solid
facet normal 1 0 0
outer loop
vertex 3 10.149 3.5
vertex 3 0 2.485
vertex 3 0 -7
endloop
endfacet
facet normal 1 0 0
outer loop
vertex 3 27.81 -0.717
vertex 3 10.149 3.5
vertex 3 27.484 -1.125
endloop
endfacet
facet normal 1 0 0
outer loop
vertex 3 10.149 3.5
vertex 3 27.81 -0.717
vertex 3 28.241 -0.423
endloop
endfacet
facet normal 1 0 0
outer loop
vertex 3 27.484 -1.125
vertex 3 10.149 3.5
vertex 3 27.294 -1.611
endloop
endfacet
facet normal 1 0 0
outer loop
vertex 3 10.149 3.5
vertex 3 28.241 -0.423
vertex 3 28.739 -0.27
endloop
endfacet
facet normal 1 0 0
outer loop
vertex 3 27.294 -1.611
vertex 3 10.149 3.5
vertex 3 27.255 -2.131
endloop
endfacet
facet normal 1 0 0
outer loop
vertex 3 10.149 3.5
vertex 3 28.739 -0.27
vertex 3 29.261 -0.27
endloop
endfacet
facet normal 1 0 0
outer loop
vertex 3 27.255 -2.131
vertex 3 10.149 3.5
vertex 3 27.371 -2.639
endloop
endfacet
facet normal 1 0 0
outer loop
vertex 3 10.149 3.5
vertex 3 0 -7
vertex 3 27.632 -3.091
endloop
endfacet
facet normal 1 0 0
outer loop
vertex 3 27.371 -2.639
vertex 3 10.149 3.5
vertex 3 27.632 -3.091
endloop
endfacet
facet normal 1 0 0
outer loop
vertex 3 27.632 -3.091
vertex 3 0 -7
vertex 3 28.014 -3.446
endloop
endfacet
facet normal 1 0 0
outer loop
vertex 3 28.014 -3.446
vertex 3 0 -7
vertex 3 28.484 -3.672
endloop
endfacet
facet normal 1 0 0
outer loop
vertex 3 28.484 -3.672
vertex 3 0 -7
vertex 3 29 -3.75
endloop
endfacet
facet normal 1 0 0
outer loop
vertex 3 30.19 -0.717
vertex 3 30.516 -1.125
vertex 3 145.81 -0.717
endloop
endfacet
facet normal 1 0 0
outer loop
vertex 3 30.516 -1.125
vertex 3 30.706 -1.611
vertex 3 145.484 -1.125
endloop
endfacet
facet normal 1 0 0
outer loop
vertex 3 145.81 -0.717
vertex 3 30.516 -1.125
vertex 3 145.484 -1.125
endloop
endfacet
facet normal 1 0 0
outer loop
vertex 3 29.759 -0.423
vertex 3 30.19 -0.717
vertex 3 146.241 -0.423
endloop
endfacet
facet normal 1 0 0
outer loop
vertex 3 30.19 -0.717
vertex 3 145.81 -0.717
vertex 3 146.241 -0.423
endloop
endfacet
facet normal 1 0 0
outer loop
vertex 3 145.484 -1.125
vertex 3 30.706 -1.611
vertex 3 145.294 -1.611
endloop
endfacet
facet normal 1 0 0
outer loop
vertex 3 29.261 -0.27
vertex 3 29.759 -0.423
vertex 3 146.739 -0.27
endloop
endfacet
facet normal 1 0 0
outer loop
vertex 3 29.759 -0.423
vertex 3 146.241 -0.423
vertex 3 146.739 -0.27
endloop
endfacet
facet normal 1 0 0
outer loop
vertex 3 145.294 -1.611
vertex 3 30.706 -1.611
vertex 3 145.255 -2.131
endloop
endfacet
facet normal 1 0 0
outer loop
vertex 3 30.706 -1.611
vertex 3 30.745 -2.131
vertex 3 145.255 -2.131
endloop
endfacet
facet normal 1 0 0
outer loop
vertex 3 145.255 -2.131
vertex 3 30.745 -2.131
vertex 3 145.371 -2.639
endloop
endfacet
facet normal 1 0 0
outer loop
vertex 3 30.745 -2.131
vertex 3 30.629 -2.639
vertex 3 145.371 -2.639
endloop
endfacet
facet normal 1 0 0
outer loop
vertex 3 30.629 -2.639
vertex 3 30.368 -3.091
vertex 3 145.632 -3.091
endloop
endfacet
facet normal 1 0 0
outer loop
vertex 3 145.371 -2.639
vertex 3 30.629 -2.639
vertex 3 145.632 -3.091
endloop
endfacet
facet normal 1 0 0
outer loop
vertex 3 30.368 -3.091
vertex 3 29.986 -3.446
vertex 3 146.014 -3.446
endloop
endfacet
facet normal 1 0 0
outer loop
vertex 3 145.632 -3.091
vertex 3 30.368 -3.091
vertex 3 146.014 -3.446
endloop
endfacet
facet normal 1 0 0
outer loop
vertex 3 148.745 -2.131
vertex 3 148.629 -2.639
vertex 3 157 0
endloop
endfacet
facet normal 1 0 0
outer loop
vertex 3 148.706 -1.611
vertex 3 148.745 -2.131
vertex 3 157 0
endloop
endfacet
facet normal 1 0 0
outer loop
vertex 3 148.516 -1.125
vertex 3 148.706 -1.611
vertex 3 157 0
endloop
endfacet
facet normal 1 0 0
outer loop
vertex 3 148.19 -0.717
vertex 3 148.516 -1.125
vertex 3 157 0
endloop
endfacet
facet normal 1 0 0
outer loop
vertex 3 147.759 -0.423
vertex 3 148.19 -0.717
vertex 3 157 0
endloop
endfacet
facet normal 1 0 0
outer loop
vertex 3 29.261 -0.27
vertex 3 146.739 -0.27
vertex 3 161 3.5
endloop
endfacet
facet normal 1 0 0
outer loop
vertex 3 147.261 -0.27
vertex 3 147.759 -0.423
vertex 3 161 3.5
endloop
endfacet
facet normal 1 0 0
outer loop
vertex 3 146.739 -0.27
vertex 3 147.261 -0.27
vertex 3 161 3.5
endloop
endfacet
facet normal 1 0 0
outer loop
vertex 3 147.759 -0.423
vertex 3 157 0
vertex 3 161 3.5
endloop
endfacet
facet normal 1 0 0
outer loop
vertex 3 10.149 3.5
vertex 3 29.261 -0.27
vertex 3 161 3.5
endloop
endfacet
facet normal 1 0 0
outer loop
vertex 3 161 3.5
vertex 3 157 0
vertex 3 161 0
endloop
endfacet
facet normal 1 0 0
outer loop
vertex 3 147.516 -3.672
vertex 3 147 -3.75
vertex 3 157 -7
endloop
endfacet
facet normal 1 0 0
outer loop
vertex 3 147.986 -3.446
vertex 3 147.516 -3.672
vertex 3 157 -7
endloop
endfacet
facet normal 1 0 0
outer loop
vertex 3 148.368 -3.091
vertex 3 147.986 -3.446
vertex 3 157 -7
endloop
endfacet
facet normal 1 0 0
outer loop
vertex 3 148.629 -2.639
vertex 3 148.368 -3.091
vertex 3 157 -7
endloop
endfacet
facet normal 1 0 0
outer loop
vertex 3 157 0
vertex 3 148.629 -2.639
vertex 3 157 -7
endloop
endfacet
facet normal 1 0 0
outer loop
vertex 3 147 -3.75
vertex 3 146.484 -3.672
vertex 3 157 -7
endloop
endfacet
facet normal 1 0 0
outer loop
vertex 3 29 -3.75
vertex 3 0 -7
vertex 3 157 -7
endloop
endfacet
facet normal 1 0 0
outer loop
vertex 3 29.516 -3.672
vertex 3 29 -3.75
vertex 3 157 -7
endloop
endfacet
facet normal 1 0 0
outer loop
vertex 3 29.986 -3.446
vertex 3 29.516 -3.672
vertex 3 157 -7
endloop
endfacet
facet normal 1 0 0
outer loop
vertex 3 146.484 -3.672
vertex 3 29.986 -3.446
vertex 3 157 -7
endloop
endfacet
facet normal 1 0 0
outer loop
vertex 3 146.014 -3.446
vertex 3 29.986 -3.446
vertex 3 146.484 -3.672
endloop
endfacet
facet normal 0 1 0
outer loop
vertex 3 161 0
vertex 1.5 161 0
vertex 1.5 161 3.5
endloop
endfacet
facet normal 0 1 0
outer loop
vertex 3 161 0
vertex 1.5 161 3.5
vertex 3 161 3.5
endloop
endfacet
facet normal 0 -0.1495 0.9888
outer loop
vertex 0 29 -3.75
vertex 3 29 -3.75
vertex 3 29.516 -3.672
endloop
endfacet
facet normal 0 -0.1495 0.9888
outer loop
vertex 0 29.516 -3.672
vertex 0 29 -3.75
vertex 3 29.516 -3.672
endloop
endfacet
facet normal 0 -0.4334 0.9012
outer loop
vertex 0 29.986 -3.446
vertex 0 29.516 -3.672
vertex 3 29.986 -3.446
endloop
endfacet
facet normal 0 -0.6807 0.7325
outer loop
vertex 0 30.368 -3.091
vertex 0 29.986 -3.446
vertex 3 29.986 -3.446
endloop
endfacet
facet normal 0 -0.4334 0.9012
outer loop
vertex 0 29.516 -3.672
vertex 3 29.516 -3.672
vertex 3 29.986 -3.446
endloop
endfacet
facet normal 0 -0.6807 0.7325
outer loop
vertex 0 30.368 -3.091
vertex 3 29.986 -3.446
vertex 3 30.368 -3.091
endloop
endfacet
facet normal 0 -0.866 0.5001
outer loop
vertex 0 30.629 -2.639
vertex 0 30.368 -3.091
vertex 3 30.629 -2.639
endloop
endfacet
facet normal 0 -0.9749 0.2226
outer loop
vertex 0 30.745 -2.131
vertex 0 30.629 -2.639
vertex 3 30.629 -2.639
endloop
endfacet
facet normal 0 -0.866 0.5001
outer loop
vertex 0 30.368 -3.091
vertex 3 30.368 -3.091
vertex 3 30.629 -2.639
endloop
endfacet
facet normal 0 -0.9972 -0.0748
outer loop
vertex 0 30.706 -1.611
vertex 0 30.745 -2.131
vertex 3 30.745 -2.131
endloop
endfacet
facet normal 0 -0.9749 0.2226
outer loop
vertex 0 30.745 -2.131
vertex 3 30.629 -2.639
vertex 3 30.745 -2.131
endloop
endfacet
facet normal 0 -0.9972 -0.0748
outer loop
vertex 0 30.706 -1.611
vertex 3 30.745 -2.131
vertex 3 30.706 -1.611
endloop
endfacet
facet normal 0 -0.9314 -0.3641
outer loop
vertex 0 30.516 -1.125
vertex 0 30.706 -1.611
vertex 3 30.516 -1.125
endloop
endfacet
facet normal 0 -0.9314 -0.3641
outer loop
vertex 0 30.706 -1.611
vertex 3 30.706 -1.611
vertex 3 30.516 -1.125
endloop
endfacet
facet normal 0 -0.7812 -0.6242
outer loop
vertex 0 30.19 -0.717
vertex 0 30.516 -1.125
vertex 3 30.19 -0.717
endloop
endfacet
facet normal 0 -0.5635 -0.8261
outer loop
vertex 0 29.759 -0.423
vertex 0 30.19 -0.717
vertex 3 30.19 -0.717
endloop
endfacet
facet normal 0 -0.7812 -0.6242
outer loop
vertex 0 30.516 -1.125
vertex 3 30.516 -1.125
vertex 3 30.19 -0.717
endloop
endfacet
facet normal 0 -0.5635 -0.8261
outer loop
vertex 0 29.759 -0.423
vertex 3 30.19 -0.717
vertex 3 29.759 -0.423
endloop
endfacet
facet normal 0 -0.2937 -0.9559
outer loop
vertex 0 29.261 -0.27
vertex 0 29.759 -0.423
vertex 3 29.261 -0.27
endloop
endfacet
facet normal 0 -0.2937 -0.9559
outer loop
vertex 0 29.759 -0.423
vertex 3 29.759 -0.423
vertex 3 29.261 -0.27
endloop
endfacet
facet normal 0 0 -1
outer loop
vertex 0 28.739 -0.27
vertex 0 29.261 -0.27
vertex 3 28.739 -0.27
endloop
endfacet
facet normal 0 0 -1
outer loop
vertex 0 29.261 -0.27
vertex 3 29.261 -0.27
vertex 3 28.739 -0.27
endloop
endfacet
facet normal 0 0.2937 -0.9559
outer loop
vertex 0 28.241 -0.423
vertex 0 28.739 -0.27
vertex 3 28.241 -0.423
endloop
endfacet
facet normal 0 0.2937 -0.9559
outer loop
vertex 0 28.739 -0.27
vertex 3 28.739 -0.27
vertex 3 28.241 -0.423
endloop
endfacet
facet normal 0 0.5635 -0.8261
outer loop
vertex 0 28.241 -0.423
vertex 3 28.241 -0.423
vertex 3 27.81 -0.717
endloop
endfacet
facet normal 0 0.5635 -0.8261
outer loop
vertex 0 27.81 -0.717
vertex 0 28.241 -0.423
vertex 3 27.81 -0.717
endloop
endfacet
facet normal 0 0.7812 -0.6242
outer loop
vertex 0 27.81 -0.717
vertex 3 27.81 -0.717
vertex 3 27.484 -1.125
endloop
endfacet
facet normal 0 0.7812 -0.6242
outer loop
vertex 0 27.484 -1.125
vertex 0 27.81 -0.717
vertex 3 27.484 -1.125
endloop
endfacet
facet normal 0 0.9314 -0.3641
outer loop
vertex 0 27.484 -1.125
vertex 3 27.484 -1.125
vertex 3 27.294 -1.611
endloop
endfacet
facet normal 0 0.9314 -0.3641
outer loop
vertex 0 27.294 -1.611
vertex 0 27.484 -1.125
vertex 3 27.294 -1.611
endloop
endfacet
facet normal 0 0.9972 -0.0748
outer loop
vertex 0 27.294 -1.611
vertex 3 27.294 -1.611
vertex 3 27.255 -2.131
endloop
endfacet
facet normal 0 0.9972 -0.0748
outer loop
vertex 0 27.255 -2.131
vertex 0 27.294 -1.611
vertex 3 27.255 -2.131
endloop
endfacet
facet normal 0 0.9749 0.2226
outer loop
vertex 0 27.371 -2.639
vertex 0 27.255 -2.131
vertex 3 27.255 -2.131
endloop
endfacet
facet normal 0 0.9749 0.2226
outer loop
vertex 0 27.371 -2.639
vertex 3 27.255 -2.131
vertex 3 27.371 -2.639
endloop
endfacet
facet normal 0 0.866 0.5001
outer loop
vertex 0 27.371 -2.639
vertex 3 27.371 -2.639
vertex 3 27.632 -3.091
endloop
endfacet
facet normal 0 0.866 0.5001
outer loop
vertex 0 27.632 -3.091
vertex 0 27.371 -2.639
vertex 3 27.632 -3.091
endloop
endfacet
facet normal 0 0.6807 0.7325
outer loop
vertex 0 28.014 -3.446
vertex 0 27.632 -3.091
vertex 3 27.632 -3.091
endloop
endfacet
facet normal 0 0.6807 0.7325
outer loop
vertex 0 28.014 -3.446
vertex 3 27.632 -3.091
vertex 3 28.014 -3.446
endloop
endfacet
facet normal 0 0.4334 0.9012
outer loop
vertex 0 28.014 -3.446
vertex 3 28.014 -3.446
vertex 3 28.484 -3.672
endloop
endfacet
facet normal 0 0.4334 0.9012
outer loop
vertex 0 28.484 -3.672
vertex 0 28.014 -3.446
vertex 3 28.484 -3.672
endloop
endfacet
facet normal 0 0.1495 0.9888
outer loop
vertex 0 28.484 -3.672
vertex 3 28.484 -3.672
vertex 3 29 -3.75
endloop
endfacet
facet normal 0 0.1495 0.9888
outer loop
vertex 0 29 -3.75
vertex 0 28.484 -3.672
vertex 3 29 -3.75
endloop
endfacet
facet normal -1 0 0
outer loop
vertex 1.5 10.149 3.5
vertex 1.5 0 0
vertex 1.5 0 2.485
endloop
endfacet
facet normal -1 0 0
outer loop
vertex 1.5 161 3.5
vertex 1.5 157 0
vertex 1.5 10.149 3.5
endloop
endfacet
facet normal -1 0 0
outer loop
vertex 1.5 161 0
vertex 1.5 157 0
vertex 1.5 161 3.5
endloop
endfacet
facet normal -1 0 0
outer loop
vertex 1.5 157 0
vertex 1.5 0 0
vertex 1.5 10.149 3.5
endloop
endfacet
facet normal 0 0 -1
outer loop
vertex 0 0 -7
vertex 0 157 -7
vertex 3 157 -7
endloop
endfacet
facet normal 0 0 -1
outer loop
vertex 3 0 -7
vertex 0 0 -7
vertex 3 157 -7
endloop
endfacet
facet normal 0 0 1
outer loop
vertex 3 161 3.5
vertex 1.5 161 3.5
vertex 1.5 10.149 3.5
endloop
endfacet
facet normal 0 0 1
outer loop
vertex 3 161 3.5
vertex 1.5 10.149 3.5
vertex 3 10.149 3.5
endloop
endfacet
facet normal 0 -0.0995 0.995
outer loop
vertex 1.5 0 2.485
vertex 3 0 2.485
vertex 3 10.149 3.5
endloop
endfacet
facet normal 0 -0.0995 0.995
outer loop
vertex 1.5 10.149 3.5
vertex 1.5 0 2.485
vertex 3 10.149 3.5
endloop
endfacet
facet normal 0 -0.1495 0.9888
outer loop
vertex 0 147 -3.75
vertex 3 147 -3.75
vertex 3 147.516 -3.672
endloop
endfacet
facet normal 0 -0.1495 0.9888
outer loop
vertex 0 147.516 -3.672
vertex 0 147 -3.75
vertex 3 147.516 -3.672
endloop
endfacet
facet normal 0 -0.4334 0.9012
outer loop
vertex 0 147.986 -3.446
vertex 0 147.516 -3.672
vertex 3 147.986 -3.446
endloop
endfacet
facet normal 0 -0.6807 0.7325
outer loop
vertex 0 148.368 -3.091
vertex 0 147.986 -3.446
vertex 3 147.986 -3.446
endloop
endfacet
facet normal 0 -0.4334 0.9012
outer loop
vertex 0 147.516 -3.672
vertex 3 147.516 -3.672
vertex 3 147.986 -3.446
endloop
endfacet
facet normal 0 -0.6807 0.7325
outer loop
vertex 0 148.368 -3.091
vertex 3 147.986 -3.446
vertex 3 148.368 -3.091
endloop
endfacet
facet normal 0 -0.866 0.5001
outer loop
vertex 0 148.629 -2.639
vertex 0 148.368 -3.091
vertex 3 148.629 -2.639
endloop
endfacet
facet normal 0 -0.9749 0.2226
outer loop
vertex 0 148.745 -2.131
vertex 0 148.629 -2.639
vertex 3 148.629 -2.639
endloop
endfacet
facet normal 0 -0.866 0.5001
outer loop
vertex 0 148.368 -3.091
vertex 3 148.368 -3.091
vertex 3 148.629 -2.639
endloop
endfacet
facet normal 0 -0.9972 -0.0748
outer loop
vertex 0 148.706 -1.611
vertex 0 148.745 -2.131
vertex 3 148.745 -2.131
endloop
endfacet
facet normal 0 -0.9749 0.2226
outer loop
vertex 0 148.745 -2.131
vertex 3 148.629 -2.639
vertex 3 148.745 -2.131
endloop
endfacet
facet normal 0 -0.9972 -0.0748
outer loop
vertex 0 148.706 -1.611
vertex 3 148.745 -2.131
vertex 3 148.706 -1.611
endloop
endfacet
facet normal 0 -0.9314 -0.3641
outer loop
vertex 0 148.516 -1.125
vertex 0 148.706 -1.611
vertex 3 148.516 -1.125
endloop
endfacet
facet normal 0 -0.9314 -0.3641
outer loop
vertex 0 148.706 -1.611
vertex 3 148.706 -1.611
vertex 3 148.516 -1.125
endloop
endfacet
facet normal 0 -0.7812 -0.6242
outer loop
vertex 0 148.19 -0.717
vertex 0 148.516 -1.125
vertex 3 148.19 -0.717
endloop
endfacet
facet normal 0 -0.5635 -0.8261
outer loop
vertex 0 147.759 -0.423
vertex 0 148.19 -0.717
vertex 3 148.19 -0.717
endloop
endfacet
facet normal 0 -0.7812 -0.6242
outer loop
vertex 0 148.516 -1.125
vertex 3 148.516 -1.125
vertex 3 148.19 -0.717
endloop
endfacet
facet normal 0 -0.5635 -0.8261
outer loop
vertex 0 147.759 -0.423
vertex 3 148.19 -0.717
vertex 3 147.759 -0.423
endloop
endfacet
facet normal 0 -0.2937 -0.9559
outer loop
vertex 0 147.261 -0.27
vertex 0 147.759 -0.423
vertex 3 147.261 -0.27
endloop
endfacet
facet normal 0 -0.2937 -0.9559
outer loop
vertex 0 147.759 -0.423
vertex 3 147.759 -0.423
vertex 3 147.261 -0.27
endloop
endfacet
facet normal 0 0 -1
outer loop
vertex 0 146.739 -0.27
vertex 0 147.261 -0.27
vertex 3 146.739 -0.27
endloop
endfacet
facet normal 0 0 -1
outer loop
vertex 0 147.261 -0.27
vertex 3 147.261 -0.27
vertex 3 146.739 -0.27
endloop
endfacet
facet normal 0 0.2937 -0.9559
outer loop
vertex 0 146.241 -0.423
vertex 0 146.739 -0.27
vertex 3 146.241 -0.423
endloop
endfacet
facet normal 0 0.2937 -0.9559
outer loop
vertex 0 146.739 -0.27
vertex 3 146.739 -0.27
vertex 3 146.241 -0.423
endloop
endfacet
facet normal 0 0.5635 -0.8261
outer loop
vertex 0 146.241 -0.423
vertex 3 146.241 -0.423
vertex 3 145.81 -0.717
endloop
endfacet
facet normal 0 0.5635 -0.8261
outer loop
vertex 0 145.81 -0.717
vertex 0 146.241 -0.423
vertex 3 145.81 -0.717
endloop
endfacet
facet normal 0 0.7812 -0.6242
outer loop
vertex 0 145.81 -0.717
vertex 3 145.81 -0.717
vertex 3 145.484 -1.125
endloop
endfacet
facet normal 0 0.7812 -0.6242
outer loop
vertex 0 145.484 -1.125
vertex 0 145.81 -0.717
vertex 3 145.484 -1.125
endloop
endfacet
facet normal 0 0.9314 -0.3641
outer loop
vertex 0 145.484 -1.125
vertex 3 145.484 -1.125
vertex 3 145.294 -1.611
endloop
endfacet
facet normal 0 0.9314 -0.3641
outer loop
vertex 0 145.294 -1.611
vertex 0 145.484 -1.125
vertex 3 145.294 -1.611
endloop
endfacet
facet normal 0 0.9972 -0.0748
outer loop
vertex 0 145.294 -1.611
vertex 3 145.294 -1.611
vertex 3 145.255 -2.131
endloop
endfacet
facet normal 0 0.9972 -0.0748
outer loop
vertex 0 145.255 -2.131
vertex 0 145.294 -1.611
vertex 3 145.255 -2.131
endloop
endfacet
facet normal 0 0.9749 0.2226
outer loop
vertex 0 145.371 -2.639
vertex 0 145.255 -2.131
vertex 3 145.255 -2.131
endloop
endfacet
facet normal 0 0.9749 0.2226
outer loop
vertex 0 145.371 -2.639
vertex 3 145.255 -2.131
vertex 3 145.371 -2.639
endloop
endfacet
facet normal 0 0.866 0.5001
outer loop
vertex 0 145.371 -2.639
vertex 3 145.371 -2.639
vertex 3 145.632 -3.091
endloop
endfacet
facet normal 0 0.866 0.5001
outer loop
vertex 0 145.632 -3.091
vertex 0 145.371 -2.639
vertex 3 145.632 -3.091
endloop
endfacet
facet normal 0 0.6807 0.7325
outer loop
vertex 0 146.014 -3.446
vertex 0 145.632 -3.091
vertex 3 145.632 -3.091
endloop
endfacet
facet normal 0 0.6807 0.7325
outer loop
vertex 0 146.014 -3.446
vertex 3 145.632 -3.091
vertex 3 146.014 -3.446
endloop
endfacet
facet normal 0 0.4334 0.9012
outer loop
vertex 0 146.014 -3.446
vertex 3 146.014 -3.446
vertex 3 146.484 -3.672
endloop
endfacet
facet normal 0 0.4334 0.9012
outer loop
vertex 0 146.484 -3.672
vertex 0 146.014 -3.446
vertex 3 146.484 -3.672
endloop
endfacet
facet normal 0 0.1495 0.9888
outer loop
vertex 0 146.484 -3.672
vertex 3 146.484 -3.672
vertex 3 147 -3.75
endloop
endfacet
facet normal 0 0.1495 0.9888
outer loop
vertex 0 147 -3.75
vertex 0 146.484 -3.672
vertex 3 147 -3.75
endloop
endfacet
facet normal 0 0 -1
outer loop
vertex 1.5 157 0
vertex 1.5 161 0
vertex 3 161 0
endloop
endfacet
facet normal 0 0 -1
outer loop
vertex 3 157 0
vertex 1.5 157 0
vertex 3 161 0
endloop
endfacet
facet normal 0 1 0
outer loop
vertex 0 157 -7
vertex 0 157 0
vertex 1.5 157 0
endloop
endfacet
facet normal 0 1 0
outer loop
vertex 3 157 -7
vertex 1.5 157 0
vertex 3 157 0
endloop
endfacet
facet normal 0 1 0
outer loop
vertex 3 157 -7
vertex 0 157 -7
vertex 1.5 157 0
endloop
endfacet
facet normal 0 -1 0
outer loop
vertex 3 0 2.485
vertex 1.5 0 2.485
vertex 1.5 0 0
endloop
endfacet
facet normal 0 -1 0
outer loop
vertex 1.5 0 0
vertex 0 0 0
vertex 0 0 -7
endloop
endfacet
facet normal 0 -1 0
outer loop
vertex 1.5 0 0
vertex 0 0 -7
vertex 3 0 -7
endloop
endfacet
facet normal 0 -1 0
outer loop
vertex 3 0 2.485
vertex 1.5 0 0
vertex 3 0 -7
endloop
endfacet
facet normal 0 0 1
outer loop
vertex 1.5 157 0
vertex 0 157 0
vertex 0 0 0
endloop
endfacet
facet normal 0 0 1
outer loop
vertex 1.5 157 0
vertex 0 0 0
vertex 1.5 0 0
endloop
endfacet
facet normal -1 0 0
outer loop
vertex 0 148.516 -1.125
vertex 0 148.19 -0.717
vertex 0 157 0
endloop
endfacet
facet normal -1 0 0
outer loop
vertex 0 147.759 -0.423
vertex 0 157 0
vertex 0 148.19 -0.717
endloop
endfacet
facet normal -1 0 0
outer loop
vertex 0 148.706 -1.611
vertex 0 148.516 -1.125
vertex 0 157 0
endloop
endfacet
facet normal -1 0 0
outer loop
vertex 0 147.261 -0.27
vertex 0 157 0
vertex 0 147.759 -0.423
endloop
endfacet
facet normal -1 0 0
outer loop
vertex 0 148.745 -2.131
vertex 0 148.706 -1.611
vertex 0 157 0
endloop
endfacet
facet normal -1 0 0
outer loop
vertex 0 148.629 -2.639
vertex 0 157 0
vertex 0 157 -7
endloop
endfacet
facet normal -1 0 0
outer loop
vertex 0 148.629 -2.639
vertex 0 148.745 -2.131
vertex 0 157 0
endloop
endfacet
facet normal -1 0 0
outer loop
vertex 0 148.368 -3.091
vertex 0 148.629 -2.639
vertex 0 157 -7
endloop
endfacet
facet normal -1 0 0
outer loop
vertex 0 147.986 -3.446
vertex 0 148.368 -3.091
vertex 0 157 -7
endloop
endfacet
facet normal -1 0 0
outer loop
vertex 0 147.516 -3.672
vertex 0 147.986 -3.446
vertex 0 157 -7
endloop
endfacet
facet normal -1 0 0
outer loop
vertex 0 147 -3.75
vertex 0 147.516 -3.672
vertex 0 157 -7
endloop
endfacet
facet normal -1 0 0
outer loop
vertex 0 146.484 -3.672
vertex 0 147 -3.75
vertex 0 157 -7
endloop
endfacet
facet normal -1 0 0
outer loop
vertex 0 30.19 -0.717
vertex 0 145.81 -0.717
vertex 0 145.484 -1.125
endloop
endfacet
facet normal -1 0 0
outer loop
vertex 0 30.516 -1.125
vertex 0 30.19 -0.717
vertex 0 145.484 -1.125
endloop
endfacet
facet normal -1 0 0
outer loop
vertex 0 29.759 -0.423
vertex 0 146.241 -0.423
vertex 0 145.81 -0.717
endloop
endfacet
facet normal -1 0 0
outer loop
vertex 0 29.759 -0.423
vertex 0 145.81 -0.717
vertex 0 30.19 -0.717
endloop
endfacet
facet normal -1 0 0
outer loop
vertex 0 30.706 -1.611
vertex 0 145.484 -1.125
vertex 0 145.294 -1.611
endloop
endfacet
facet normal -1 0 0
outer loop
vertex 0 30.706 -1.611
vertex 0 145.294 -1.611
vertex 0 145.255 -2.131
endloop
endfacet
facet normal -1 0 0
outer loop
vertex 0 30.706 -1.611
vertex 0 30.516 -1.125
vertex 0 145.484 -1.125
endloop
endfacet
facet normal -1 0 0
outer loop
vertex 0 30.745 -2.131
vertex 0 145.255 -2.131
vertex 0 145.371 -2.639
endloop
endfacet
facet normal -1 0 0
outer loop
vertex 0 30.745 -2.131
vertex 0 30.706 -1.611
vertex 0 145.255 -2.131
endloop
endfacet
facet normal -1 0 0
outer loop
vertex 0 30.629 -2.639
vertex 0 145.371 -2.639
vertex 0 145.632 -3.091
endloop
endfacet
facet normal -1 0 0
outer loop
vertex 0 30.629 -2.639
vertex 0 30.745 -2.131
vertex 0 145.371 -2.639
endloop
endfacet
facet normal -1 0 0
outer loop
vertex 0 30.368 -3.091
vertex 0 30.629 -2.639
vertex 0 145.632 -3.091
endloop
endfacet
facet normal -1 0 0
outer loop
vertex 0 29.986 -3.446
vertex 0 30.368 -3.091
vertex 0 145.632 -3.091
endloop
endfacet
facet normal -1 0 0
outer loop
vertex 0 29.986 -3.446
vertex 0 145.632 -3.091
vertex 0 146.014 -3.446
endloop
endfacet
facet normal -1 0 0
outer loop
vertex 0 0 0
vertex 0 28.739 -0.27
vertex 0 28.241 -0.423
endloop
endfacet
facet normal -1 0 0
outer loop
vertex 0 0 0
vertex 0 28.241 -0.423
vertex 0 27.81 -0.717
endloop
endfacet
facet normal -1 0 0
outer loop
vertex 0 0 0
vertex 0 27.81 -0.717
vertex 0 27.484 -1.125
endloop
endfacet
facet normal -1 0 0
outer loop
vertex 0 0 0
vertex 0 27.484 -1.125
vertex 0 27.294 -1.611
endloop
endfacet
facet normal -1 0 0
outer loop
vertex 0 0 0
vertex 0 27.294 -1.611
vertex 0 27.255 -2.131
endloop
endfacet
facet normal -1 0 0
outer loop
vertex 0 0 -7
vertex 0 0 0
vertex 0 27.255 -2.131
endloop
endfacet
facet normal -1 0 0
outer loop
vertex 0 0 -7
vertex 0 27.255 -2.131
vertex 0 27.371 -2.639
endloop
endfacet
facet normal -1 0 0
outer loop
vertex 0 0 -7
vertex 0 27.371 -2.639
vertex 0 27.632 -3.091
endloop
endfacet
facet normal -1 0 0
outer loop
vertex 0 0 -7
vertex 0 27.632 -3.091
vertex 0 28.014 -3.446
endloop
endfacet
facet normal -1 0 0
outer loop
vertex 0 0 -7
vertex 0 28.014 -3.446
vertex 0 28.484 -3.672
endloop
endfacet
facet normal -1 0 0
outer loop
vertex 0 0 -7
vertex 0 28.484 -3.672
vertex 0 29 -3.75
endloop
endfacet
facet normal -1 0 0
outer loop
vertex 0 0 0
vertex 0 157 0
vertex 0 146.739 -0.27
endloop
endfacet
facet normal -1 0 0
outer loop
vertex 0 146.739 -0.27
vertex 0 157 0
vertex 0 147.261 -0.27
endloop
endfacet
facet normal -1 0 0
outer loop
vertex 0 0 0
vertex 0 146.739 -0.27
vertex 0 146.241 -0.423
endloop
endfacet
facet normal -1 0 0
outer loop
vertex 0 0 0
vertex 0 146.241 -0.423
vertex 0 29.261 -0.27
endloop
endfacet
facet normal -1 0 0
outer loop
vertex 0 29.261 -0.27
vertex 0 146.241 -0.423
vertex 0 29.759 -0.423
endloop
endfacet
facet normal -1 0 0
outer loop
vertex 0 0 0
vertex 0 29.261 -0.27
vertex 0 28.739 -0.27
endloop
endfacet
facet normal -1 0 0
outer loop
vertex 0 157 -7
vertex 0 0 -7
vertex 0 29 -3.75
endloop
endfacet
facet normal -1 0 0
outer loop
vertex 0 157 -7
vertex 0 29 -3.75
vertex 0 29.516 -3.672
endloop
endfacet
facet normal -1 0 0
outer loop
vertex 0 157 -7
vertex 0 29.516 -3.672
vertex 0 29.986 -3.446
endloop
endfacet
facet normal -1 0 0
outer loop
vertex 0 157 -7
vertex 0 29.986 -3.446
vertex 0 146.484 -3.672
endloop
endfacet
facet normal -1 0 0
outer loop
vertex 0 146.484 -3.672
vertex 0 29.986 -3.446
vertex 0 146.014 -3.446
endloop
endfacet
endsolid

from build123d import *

# Parameters (mm, degrees)
SKETCH1_W           = 3
SKETCH1_H           = 7
BOSS_EXTRUDE1_DEPTH = 157
SKETCH2_W           = 1.5
SKETCH2_H           = 161
BOSS_EXTRUDE2_DEPTH = 3.5
SKETCH3_R           = 1.75
CUT_EXTRUDE1_DEPTH  = 4
CUT_EXTRUDE2_DEPTH  = 4


with BuildPart() as part:
    # Sketch1 → Boss-Extrude1 (new body)
    with BuildSketch(Plane(origin=(0, 0, 0), x_dir=(1, 0, 0), z_dir=(0, 1, 0))):
        with Locations((1.5, 3.5)):
            Rectangle(SKETCH1_W, SKETCH1_H)
    extrude(amount=BOSS_EXTRUDE1_DEPTH)

    # Sketch2 → Boss-Extrude2 (add)
    with BuildSketch(Plane.XY):
        with Locations((2.25, 80.5)):
            Rectangle(SKETCH2_W, SKETCH2_H)
    extrude(amount=BOSS_EXTRUDE2_DEPTH)

    # Sketch3 → Cut-Extrude1 (cut, through all)
    with BuildSketch(Plane(origin=(3, 0, 0), x_dir=(0, 0, -1), z_dir=(1, 0, 0))):
        with Locations((2, 147)):
            Circle(SKETCH3_R)
        with Locations((2, 29)):
            Circle(SKETCH3_R)
    extrude(amount=-CUT_EXTRUDE1_DEPTH, mode=Mode.SUBTRACT)

    # Sketch4 → Cut-Extrude2 (cut, through all)
    with BuildSketch(Plane(origin=(3, 0, 0), x_dir=(0, 0, -1), z_dir=(1, 0, 0))):
        Polygon((-2.485167134, 0), (-3.5, 10.149389846), (-3.5, 0), align=None)
    extrude(amount=-CUT_EXTRUDE2_DEPTH, mode=Mode.SUBTRACT)


solid = part.part
